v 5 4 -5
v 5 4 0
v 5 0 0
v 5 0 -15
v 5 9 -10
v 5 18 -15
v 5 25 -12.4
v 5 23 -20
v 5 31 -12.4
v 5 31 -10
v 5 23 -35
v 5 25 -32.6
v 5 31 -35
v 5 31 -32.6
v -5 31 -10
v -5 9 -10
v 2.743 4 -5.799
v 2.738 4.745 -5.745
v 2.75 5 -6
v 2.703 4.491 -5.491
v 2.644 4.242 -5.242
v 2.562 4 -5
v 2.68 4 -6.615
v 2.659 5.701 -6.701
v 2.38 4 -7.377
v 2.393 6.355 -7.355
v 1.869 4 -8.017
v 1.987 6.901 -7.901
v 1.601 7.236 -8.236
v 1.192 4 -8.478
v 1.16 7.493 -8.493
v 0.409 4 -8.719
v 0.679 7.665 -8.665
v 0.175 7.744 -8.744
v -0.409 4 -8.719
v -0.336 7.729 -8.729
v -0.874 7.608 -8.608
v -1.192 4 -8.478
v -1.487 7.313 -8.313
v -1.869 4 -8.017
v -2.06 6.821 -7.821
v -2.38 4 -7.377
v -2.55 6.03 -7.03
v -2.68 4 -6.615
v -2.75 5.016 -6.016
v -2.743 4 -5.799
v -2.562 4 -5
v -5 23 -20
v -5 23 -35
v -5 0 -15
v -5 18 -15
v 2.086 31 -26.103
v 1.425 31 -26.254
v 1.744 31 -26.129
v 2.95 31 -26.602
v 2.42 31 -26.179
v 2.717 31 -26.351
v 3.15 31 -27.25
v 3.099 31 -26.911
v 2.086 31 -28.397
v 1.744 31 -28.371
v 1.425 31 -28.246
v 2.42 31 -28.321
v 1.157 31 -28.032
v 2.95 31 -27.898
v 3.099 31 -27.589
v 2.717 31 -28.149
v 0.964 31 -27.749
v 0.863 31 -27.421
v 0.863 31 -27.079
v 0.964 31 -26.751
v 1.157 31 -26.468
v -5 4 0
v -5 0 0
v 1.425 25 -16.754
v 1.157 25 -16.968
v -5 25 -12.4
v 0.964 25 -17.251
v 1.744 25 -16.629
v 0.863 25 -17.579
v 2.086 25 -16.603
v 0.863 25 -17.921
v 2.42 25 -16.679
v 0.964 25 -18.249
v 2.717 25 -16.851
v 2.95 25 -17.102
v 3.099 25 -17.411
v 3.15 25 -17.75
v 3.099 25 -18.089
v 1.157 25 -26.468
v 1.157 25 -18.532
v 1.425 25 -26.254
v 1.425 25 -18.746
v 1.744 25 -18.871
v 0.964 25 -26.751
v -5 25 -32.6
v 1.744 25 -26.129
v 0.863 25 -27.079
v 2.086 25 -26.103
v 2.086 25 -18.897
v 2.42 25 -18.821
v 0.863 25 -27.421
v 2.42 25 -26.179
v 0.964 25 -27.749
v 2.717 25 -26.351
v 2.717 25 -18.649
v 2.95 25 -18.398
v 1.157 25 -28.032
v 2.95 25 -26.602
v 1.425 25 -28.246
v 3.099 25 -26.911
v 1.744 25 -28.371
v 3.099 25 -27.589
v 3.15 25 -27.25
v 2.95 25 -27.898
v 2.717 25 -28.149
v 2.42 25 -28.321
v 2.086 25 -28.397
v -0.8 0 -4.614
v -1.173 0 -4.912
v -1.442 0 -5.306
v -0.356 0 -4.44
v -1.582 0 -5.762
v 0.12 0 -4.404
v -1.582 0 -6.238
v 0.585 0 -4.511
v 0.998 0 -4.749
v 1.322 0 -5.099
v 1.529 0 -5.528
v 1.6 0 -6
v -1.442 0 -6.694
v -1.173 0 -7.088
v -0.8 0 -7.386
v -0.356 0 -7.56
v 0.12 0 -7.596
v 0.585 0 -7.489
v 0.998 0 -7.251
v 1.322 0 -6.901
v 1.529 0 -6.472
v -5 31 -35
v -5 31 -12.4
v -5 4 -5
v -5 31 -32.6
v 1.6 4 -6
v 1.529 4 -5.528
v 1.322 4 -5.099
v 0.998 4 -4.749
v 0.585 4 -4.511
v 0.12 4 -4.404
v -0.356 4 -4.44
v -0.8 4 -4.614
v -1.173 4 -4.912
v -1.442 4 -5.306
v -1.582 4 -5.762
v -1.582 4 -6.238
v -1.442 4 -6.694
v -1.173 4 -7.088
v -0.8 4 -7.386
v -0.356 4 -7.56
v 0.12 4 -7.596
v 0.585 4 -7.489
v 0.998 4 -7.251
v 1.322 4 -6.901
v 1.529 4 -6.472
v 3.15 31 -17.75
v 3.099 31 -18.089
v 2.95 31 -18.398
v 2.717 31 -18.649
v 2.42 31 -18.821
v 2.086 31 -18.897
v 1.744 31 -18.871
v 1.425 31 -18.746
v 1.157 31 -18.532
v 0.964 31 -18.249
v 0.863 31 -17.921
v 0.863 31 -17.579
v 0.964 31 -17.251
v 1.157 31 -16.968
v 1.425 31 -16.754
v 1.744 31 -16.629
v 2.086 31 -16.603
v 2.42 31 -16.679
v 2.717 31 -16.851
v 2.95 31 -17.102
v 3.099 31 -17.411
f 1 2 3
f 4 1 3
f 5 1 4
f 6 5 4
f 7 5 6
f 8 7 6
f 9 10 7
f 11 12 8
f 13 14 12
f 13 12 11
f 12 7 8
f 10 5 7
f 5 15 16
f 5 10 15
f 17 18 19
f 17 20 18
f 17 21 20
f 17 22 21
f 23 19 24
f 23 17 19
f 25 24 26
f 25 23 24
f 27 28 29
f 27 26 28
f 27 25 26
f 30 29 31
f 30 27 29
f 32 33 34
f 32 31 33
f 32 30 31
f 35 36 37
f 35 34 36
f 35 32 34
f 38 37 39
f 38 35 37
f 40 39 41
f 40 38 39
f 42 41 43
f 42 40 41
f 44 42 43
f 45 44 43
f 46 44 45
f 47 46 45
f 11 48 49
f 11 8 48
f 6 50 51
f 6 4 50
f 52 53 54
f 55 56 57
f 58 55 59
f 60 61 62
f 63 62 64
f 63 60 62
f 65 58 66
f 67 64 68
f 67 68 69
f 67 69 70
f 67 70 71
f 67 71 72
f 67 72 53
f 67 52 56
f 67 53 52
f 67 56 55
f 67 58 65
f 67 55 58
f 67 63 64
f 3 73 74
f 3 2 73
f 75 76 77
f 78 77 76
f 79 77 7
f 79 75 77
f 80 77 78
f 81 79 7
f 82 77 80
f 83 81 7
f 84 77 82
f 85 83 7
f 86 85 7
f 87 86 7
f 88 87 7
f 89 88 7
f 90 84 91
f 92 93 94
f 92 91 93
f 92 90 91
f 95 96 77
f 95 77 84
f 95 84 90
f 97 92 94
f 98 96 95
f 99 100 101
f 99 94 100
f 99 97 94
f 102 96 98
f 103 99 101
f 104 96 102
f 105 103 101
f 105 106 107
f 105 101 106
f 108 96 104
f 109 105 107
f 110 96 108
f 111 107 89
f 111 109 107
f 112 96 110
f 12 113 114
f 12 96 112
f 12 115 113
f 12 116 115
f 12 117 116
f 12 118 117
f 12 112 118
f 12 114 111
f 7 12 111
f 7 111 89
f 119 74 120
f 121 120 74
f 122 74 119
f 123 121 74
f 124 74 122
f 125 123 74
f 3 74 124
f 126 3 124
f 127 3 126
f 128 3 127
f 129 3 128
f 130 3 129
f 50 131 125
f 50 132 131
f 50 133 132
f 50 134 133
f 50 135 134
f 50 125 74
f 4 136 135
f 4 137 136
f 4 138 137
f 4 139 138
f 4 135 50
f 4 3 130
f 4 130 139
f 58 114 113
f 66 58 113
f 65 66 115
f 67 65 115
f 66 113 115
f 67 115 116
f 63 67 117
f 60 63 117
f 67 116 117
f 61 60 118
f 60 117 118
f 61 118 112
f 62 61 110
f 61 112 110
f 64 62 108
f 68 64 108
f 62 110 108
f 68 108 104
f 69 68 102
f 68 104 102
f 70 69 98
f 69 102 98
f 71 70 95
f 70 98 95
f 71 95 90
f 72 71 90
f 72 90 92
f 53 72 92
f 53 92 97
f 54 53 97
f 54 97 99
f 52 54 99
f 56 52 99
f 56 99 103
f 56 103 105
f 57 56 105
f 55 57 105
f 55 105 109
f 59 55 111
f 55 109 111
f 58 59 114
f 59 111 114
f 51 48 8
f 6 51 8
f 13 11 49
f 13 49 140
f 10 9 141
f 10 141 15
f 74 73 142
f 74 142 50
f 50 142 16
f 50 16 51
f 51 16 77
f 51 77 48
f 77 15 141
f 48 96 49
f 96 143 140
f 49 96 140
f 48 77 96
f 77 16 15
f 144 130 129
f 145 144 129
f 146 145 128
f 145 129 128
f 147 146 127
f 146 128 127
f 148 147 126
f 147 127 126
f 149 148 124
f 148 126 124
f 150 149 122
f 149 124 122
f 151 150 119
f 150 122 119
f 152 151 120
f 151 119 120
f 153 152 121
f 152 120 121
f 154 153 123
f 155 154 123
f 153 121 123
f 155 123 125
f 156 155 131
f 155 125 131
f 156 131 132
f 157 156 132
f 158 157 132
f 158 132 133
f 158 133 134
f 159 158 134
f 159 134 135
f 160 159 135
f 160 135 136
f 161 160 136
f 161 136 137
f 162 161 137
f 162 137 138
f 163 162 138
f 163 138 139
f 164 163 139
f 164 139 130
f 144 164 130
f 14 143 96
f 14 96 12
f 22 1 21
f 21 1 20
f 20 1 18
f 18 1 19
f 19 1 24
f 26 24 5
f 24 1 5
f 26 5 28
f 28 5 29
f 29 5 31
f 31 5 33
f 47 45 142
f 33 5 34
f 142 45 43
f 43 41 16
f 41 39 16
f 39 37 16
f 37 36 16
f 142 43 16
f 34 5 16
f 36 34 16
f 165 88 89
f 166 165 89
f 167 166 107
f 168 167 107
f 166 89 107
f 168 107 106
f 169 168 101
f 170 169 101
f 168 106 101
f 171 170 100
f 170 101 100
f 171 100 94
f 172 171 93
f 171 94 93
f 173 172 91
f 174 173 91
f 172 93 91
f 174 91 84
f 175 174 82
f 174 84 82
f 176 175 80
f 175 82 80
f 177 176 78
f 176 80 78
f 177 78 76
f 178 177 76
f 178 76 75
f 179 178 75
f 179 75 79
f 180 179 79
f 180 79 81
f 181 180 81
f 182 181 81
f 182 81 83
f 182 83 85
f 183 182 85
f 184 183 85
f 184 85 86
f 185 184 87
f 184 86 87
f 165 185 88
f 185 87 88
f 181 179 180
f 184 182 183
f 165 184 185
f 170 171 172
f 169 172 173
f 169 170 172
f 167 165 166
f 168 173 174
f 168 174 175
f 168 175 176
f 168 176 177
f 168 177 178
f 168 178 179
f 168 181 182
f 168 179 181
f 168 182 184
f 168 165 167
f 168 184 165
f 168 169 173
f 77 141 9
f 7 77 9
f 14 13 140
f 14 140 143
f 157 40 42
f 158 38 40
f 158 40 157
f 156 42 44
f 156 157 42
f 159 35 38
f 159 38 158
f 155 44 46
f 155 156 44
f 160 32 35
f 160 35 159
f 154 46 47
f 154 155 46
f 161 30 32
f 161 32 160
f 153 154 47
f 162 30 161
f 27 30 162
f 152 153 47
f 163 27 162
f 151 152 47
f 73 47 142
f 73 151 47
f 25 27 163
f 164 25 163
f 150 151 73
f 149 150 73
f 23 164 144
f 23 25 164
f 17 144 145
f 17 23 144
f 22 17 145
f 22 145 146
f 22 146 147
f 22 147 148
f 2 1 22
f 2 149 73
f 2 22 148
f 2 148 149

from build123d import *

# Parameters (mm, degrees)
EXTRUDE_1_DEPTH     = 5
SKETCH_2_W          = 20
SKETCH_2_H          = 20.2
CUT_EXTRUDE_1_DEPTH = 6
SKETCH_3_R          = 1.15
EXTRUDE_2_DEPTH     = 6
CHAMFER_1_SIZE      = 5
SKETCH_4_R          = 1.6
CUT_EXTRUDE_2_DEPTH = 32
SKETCH_5_R          = 2.75
CUT_EXTRUDE_3_DEPTH = 6


with BuildPart() as part:
    # 草图1 → 凸台-拉伸1 (new body, symmetric)
    with BuildSketch(Plane(origin=(0, 0, 0), x_dir=(0, 0, -1), z_dir=(1, 0, 0))):
        Polygon((0, 0), (15, 0), (15, 23), (35, 23), (35, 31), (10, 31), (10, 4), (0, 4), align=None)
    extrude(amount=EXTRUDE_1_DEPTH, both=True)

    # 草图2 → 切除-拉伸1 (cut)
    with BuildSketch(Plane(origin=(0, 31, 0), x_dir=(1, 0, 0), z_dir=(0, 1, 0))):
        with Locations((5, 22.5)):
            Rectangle(SKETCH_2_W, SKETCH_2_H)
    extrude(amount=-CUT_EXTRUDE_1_DEPTH, mode=Mode.SUBTRACT)

    # 草图3 → 凸台-拉伸2 (add)
    with BuildSketch(Plane(origin=(0, 25, 0), x_dir=(1, 0, 0), z_dir=(0, 1, 0))):
        with Locations((2, 27.25)):
            Circle(SKETCH_3_R)
        with Locations((2, 17.75)):
            Circle(SKETCH_3_R)
    extrude(amount=EXTRUDE_2_DEPTH)

    # 倒角1
    chamfer_1_edges = [part.edges().sort_by_distance(p)[0] for p in [
        (0, 4, -10),
        (0, 23, -15),
    ]]
    chamfer(chamfer_1_edges, length=CHAMFER_1_SIZE)

    # 草图4 → 切除-拉伸2 (cut, through all)
    with BuildSketch(Plane.XZ):
        with Locations((0, -6)):
            Circle(SKETCH_4_R)
    extrude(amount=-CUT_EXTRUDE_2_DEPTH, mode=Mode.SUBTRACT)

    # 草图5 → 切除-拉伸3 (cut)
    with BuildSketch(Plane(origin=(0, 4, 0), x_dir=(1, 0, 0), z_dir=(0, 1, 0))):
        with Locations((0, 6)):
            Circle(SKETCH_5_R)
    extrude(amount=CUT_EXTRUDE_3_DEPTH, mode=Mode.SUBTRACT)


solid = part.part
